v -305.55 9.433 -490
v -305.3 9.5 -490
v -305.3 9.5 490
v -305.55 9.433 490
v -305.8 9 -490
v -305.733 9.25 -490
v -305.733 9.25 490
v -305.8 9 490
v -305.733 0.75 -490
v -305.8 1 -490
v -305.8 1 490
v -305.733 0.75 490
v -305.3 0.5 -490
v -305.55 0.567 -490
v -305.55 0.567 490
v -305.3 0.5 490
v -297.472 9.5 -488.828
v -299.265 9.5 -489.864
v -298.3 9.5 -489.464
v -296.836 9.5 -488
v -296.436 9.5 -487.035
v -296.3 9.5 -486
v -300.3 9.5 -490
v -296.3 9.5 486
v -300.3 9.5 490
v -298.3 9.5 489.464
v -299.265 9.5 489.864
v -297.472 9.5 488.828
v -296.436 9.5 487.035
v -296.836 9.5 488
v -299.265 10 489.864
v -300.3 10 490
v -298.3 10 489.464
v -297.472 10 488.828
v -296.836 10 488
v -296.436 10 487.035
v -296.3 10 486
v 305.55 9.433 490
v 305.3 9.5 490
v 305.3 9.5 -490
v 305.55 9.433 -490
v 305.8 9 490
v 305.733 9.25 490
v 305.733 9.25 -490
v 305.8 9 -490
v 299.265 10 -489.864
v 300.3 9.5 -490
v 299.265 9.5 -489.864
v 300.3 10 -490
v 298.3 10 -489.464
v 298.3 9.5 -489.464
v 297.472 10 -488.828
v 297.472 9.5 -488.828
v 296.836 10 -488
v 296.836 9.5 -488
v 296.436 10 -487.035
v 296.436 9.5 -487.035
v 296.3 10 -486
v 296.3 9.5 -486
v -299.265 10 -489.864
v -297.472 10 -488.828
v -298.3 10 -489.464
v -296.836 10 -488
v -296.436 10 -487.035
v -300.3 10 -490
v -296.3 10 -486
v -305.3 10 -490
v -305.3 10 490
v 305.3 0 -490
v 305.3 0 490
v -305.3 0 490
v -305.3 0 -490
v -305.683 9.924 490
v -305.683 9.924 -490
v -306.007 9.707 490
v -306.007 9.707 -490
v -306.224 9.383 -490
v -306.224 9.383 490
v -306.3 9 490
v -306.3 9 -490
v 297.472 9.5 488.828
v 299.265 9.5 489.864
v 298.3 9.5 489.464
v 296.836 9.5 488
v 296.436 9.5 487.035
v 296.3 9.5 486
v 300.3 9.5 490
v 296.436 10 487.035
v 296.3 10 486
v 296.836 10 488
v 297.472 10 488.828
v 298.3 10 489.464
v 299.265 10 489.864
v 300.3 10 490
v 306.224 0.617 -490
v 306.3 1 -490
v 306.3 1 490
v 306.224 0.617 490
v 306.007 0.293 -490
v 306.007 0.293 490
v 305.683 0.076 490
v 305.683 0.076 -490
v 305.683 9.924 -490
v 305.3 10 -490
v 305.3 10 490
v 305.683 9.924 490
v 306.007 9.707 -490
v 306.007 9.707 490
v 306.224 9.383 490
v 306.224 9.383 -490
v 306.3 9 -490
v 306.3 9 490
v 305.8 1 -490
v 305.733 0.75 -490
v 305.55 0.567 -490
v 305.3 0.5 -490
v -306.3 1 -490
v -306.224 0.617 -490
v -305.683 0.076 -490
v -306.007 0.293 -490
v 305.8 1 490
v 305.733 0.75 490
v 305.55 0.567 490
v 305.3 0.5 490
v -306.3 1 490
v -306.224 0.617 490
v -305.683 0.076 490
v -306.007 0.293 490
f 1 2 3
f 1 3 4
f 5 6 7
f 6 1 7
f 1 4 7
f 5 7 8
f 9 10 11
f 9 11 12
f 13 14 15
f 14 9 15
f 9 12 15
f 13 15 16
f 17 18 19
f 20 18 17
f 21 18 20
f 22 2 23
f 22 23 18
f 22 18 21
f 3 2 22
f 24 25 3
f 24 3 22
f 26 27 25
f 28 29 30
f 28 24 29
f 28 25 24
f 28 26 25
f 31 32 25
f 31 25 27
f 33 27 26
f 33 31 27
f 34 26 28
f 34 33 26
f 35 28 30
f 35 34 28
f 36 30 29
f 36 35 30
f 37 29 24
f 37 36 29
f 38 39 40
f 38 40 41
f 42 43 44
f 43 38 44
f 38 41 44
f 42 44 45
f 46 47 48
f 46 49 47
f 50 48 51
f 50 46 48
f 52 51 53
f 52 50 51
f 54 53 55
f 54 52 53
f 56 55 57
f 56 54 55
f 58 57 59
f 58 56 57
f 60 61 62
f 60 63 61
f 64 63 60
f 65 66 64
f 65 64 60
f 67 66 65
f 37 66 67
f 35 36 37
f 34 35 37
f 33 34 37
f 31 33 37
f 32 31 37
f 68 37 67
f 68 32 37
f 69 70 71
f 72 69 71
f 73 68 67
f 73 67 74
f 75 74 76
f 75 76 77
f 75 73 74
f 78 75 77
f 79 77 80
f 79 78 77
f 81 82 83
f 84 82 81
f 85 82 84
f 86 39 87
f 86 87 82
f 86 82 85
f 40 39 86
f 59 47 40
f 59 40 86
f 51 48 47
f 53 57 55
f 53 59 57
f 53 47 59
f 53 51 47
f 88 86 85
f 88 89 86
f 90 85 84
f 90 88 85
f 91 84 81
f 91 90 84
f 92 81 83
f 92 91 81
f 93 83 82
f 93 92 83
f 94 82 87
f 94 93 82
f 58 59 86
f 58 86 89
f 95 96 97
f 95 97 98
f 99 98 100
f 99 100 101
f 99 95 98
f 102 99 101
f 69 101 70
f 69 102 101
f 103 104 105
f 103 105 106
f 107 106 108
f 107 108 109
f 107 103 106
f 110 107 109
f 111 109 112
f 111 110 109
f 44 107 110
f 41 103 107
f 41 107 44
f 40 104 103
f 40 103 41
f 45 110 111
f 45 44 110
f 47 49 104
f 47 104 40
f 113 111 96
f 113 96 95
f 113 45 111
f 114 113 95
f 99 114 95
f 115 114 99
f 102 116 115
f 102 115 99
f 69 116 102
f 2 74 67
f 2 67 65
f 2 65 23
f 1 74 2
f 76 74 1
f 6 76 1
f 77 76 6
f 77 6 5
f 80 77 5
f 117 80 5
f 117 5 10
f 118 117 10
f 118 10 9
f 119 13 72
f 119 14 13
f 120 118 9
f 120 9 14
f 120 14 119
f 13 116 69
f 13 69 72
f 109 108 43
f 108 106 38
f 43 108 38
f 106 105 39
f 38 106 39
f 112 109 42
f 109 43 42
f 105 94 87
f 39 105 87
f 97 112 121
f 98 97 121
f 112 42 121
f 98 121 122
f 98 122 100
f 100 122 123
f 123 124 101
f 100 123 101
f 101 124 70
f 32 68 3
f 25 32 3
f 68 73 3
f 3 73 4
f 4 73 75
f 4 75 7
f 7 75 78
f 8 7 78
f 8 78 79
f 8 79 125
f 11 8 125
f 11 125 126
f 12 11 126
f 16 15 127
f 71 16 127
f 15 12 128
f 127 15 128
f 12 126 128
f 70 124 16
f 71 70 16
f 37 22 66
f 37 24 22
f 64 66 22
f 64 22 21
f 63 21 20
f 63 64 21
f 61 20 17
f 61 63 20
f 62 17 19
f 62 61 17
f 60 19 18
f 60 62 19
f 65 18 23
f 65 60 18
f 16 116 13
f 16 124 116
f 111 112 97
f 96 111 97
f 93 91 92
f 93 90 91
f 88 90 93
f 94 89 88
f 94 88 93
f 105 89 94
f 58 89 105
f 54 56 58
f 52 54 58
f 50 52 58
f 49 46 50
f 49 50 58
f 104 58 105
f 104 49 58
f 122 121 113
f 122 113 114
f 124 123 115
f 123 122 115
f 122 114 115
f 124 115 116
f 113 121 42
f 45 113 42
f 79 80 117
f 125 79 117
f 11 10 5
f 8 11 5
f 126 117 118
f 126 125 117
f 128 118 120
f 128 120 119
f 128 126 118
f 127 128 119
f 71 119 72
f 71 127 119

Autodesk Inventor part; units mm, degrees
ref_plane "YZ Plane" through (0, 0, 0) normal (1, 0, 0) x (0, 1, 0)
ref_plane "XZ Plane" through (0, 0, 0) normal (0, 1, 0) x (-1, 0, 0)
ref_plane "XY Plane" through (0, 0, 0) normal (0, 0, 1) x (1, 0, 0)
sketch "Sketch6" plane through (0, 0, 0) normal (0, 1, 0) x (-1, 0, 0)
  line L0 (306.3, -490) -> (-306.3, -490)
  line L1 (-306.3, -490) -> (-306.3, 490)
  line L2 (-306.3, 490) -> (306.3, 490)
  line L3 (306.3, 490) -> (306.3, -490)
  line L4 (306.3, -490) -> (-306.3, 490) construction
  line L5 (-306.3, -490) -> (306.3, 490) construction
  point P0 (0, 0)
  dimension "d52" = 612.6
  dimension "d53" = 980
extrude "Plate2" add sketch "Sketch6" along normal blind 0.5
sketch "Sketch11" plane through (-305.8, 0, 490) normal (-1, 0, 0) x (0, -1, 0)
  line L0 (0, -980) -> (0, 0)
  line L1 (0, 0) -> (-10, 0)
  line L2 (-10, 0) -> (-10, -980)
  line L3 (-10, -980) -> (0, -980)
edge flange "Flange2" height 10 angle 90 thickness 0.5 bend radius 0.5 thickness toward (-1, 0, 0) relief tear relief width 0.5 relief depth 0.25 edges at (-306.3, 0.5, 0) wall of the first edge with corners at (-305.8, 0, -490) (-305.8, 0, 490) (-305.8, 10, 490) (-305.8, 10, -490)
bend "Bend3"
corner "Corner3"
sketch "Sketch12" plane through (-306.3, 9.5, 490) normal (0, 1, 0) x (-1, 0, 0)
  line L0 (0, -980) -> (0, 0)
  line L1 (0, 0) -> (-10, 0)
  line L2 (-10, 0) -> (-10, -980)
  line L3 (-10, -980) -> (0, -980)
edge flange "Flange3" height 10 angle 90 thickness 0.5 bend radius 0.5 thickness toward (0, 1, 0) relief tear relief width 0.5 relief depth 0.25 edges at (-305.8, 10, 0) wall of the first edge with corners at (-306.3, 9.5, -490) (-306.3, 9.5, 490) (-296.3, 9.5, 490) (-296.3, 9.5, -490)
bend "Bend4"
corner "Corner4"
sketch "Sketch13" plane through (305.8, 0, -490) normal (1, 0, 0) x (0, 1, 0)
  line L0 (0, 980) -> (0, 0)
  line L1 (0, 0) -> (10, 0)
  line L2 (10, 0) -> (10, 980)
  line L3 (10, 980) -> (0, 980)
edge flange "Flange4" height 10 angle 90 thickness 0.5 bend radius 0.5 thickness toward (1, 0, 0) relief tear relief width 0.5 relief depth 0.25 edges at (306.3, 0.5, 0) wall of the first edge with corners at (305.8, 0, 490) (305.8, 0, -490) (305.8, 10, -490) (305.8, 10, 490)
bend "Bend5"
corner "Corner5"
sketch "Sketch14" plane through (306.3, 9.5, -490) normal (0, 1, 0) x (-1, 0, 0)
  line L0 (0, 980) -> (0, 0)
  line L1 (0, 0) -> (10, 0)
  line L2 (10, 0) -> (10, 980)
  line L3 (10, 980) -> (0, 980)
edge flange "Flange5" height 10 angle 90 thickness 0.5 bend radius 0.5 thickness toward (0, 1, 0) relief tear relief width 0.5 relief depth 0.25 edges at (305.8, 10, 0) wall of the first edge with corners at (306.3, 9.5, 490) (306.3, 9.5, -490) (296.3, 9.5, -490) (296.3, 9.5, 490)
bend "Bend6"
corner "Corner6"
fillet "Corner Round1" radius 4 4 edges at (296.3, 9.75, -490) (296.3, 9.75, 490) (-296.3, 9.75, -490) (-296.3, 9.75, 490)
equation "\"d52\" = ЖАБРЫ_базовая_ширина - 3 * ЖАБРЫ_шаг_листов"
equation "\"d53\" = ЖАБРЫ_базовая_длина_кор_лист"
equation "\"d54\" = Thickness"
equation "\"d84\" = BendReliefWidth"
equation "\"d85\" = BendReliefDepth"
equation "\"d86\" = MinimumRemnant"
equation "\"d87\" = TransitionRadius"
equation "\"d90\" = BendRadius"
equation "\"d91\" = CornerReliefSize"
equation "\"d92\" = GapSize"
equation "\"d93\" = JacobiRadiusSize"
equation "\"d94\" = BendReliefWidth"
equation "\"d95\" = BendReliefDepth"
equation "\"d96\" = MinimumRemnant"
equation "\"d97\" = TransitionRadius"
equation "\"d100\" = BendRadius"
equation "\"d101\" = CornerReliefSize"
equation "\"d102\" = GapSize"
equation "\"d103\" = JacobiRadiusSize"
equation "\"d104\" = BendReliefWidth"
equation "\"d105\" = BendReliefDepth"
equation "\"d106\" = MinimumRemnant"
equation "\"d107\" = TransitionRadius"
equation "\"d110\" = BendRadius"
equation "\"d111\" = CornerReliefSize"
equation "\"d112\" = GapSize"
equation "\"d113\" = JacobiRadiusSize"
equation "\"d114\" = BendReliefWidth"
equation "\"d115\" = BendReliefDepth"
equation "\"d116\" = MinimumRemnant"
equation "\"d117\" = TransitionRadius"
equation "\"d120\" = BendRadius"
equation "\"d121\" = CornerReliefSize"
equation "\"d122\" = GapSize"
equation "\"d123\" = JacobiRadiusSize"
equation "\"BendRadius\" = Thickness"
equation "\"BendReliefWidth\" = Thickness"
equation "\"BendReliefDepth\" = 0.5 * Thickness"
equation "\"CornerReliefSize\" = 4 * Thickness"
equation "\"MinimumRemnant\" = 2 * Thickness"
equation "\"TransitionRadius\" = BendRadius"
equation "\"JacobiRadiusSize\" = BendRadius"
equation "\"GapSize\" = Thickness"
equation "\"ЖАБРЫ_базовая_ширина\" = 915"
equation "\"ЖАБРЫ_шаг_листов\" = 100.8"
equation "\"ЖАБРЫ_базовая_длина_кор_лист\" = 980"
equation "\"Thickness\" = 0.5"
properties part number "MSC 807 SHEET GILLS" material "Stainless Steel"
